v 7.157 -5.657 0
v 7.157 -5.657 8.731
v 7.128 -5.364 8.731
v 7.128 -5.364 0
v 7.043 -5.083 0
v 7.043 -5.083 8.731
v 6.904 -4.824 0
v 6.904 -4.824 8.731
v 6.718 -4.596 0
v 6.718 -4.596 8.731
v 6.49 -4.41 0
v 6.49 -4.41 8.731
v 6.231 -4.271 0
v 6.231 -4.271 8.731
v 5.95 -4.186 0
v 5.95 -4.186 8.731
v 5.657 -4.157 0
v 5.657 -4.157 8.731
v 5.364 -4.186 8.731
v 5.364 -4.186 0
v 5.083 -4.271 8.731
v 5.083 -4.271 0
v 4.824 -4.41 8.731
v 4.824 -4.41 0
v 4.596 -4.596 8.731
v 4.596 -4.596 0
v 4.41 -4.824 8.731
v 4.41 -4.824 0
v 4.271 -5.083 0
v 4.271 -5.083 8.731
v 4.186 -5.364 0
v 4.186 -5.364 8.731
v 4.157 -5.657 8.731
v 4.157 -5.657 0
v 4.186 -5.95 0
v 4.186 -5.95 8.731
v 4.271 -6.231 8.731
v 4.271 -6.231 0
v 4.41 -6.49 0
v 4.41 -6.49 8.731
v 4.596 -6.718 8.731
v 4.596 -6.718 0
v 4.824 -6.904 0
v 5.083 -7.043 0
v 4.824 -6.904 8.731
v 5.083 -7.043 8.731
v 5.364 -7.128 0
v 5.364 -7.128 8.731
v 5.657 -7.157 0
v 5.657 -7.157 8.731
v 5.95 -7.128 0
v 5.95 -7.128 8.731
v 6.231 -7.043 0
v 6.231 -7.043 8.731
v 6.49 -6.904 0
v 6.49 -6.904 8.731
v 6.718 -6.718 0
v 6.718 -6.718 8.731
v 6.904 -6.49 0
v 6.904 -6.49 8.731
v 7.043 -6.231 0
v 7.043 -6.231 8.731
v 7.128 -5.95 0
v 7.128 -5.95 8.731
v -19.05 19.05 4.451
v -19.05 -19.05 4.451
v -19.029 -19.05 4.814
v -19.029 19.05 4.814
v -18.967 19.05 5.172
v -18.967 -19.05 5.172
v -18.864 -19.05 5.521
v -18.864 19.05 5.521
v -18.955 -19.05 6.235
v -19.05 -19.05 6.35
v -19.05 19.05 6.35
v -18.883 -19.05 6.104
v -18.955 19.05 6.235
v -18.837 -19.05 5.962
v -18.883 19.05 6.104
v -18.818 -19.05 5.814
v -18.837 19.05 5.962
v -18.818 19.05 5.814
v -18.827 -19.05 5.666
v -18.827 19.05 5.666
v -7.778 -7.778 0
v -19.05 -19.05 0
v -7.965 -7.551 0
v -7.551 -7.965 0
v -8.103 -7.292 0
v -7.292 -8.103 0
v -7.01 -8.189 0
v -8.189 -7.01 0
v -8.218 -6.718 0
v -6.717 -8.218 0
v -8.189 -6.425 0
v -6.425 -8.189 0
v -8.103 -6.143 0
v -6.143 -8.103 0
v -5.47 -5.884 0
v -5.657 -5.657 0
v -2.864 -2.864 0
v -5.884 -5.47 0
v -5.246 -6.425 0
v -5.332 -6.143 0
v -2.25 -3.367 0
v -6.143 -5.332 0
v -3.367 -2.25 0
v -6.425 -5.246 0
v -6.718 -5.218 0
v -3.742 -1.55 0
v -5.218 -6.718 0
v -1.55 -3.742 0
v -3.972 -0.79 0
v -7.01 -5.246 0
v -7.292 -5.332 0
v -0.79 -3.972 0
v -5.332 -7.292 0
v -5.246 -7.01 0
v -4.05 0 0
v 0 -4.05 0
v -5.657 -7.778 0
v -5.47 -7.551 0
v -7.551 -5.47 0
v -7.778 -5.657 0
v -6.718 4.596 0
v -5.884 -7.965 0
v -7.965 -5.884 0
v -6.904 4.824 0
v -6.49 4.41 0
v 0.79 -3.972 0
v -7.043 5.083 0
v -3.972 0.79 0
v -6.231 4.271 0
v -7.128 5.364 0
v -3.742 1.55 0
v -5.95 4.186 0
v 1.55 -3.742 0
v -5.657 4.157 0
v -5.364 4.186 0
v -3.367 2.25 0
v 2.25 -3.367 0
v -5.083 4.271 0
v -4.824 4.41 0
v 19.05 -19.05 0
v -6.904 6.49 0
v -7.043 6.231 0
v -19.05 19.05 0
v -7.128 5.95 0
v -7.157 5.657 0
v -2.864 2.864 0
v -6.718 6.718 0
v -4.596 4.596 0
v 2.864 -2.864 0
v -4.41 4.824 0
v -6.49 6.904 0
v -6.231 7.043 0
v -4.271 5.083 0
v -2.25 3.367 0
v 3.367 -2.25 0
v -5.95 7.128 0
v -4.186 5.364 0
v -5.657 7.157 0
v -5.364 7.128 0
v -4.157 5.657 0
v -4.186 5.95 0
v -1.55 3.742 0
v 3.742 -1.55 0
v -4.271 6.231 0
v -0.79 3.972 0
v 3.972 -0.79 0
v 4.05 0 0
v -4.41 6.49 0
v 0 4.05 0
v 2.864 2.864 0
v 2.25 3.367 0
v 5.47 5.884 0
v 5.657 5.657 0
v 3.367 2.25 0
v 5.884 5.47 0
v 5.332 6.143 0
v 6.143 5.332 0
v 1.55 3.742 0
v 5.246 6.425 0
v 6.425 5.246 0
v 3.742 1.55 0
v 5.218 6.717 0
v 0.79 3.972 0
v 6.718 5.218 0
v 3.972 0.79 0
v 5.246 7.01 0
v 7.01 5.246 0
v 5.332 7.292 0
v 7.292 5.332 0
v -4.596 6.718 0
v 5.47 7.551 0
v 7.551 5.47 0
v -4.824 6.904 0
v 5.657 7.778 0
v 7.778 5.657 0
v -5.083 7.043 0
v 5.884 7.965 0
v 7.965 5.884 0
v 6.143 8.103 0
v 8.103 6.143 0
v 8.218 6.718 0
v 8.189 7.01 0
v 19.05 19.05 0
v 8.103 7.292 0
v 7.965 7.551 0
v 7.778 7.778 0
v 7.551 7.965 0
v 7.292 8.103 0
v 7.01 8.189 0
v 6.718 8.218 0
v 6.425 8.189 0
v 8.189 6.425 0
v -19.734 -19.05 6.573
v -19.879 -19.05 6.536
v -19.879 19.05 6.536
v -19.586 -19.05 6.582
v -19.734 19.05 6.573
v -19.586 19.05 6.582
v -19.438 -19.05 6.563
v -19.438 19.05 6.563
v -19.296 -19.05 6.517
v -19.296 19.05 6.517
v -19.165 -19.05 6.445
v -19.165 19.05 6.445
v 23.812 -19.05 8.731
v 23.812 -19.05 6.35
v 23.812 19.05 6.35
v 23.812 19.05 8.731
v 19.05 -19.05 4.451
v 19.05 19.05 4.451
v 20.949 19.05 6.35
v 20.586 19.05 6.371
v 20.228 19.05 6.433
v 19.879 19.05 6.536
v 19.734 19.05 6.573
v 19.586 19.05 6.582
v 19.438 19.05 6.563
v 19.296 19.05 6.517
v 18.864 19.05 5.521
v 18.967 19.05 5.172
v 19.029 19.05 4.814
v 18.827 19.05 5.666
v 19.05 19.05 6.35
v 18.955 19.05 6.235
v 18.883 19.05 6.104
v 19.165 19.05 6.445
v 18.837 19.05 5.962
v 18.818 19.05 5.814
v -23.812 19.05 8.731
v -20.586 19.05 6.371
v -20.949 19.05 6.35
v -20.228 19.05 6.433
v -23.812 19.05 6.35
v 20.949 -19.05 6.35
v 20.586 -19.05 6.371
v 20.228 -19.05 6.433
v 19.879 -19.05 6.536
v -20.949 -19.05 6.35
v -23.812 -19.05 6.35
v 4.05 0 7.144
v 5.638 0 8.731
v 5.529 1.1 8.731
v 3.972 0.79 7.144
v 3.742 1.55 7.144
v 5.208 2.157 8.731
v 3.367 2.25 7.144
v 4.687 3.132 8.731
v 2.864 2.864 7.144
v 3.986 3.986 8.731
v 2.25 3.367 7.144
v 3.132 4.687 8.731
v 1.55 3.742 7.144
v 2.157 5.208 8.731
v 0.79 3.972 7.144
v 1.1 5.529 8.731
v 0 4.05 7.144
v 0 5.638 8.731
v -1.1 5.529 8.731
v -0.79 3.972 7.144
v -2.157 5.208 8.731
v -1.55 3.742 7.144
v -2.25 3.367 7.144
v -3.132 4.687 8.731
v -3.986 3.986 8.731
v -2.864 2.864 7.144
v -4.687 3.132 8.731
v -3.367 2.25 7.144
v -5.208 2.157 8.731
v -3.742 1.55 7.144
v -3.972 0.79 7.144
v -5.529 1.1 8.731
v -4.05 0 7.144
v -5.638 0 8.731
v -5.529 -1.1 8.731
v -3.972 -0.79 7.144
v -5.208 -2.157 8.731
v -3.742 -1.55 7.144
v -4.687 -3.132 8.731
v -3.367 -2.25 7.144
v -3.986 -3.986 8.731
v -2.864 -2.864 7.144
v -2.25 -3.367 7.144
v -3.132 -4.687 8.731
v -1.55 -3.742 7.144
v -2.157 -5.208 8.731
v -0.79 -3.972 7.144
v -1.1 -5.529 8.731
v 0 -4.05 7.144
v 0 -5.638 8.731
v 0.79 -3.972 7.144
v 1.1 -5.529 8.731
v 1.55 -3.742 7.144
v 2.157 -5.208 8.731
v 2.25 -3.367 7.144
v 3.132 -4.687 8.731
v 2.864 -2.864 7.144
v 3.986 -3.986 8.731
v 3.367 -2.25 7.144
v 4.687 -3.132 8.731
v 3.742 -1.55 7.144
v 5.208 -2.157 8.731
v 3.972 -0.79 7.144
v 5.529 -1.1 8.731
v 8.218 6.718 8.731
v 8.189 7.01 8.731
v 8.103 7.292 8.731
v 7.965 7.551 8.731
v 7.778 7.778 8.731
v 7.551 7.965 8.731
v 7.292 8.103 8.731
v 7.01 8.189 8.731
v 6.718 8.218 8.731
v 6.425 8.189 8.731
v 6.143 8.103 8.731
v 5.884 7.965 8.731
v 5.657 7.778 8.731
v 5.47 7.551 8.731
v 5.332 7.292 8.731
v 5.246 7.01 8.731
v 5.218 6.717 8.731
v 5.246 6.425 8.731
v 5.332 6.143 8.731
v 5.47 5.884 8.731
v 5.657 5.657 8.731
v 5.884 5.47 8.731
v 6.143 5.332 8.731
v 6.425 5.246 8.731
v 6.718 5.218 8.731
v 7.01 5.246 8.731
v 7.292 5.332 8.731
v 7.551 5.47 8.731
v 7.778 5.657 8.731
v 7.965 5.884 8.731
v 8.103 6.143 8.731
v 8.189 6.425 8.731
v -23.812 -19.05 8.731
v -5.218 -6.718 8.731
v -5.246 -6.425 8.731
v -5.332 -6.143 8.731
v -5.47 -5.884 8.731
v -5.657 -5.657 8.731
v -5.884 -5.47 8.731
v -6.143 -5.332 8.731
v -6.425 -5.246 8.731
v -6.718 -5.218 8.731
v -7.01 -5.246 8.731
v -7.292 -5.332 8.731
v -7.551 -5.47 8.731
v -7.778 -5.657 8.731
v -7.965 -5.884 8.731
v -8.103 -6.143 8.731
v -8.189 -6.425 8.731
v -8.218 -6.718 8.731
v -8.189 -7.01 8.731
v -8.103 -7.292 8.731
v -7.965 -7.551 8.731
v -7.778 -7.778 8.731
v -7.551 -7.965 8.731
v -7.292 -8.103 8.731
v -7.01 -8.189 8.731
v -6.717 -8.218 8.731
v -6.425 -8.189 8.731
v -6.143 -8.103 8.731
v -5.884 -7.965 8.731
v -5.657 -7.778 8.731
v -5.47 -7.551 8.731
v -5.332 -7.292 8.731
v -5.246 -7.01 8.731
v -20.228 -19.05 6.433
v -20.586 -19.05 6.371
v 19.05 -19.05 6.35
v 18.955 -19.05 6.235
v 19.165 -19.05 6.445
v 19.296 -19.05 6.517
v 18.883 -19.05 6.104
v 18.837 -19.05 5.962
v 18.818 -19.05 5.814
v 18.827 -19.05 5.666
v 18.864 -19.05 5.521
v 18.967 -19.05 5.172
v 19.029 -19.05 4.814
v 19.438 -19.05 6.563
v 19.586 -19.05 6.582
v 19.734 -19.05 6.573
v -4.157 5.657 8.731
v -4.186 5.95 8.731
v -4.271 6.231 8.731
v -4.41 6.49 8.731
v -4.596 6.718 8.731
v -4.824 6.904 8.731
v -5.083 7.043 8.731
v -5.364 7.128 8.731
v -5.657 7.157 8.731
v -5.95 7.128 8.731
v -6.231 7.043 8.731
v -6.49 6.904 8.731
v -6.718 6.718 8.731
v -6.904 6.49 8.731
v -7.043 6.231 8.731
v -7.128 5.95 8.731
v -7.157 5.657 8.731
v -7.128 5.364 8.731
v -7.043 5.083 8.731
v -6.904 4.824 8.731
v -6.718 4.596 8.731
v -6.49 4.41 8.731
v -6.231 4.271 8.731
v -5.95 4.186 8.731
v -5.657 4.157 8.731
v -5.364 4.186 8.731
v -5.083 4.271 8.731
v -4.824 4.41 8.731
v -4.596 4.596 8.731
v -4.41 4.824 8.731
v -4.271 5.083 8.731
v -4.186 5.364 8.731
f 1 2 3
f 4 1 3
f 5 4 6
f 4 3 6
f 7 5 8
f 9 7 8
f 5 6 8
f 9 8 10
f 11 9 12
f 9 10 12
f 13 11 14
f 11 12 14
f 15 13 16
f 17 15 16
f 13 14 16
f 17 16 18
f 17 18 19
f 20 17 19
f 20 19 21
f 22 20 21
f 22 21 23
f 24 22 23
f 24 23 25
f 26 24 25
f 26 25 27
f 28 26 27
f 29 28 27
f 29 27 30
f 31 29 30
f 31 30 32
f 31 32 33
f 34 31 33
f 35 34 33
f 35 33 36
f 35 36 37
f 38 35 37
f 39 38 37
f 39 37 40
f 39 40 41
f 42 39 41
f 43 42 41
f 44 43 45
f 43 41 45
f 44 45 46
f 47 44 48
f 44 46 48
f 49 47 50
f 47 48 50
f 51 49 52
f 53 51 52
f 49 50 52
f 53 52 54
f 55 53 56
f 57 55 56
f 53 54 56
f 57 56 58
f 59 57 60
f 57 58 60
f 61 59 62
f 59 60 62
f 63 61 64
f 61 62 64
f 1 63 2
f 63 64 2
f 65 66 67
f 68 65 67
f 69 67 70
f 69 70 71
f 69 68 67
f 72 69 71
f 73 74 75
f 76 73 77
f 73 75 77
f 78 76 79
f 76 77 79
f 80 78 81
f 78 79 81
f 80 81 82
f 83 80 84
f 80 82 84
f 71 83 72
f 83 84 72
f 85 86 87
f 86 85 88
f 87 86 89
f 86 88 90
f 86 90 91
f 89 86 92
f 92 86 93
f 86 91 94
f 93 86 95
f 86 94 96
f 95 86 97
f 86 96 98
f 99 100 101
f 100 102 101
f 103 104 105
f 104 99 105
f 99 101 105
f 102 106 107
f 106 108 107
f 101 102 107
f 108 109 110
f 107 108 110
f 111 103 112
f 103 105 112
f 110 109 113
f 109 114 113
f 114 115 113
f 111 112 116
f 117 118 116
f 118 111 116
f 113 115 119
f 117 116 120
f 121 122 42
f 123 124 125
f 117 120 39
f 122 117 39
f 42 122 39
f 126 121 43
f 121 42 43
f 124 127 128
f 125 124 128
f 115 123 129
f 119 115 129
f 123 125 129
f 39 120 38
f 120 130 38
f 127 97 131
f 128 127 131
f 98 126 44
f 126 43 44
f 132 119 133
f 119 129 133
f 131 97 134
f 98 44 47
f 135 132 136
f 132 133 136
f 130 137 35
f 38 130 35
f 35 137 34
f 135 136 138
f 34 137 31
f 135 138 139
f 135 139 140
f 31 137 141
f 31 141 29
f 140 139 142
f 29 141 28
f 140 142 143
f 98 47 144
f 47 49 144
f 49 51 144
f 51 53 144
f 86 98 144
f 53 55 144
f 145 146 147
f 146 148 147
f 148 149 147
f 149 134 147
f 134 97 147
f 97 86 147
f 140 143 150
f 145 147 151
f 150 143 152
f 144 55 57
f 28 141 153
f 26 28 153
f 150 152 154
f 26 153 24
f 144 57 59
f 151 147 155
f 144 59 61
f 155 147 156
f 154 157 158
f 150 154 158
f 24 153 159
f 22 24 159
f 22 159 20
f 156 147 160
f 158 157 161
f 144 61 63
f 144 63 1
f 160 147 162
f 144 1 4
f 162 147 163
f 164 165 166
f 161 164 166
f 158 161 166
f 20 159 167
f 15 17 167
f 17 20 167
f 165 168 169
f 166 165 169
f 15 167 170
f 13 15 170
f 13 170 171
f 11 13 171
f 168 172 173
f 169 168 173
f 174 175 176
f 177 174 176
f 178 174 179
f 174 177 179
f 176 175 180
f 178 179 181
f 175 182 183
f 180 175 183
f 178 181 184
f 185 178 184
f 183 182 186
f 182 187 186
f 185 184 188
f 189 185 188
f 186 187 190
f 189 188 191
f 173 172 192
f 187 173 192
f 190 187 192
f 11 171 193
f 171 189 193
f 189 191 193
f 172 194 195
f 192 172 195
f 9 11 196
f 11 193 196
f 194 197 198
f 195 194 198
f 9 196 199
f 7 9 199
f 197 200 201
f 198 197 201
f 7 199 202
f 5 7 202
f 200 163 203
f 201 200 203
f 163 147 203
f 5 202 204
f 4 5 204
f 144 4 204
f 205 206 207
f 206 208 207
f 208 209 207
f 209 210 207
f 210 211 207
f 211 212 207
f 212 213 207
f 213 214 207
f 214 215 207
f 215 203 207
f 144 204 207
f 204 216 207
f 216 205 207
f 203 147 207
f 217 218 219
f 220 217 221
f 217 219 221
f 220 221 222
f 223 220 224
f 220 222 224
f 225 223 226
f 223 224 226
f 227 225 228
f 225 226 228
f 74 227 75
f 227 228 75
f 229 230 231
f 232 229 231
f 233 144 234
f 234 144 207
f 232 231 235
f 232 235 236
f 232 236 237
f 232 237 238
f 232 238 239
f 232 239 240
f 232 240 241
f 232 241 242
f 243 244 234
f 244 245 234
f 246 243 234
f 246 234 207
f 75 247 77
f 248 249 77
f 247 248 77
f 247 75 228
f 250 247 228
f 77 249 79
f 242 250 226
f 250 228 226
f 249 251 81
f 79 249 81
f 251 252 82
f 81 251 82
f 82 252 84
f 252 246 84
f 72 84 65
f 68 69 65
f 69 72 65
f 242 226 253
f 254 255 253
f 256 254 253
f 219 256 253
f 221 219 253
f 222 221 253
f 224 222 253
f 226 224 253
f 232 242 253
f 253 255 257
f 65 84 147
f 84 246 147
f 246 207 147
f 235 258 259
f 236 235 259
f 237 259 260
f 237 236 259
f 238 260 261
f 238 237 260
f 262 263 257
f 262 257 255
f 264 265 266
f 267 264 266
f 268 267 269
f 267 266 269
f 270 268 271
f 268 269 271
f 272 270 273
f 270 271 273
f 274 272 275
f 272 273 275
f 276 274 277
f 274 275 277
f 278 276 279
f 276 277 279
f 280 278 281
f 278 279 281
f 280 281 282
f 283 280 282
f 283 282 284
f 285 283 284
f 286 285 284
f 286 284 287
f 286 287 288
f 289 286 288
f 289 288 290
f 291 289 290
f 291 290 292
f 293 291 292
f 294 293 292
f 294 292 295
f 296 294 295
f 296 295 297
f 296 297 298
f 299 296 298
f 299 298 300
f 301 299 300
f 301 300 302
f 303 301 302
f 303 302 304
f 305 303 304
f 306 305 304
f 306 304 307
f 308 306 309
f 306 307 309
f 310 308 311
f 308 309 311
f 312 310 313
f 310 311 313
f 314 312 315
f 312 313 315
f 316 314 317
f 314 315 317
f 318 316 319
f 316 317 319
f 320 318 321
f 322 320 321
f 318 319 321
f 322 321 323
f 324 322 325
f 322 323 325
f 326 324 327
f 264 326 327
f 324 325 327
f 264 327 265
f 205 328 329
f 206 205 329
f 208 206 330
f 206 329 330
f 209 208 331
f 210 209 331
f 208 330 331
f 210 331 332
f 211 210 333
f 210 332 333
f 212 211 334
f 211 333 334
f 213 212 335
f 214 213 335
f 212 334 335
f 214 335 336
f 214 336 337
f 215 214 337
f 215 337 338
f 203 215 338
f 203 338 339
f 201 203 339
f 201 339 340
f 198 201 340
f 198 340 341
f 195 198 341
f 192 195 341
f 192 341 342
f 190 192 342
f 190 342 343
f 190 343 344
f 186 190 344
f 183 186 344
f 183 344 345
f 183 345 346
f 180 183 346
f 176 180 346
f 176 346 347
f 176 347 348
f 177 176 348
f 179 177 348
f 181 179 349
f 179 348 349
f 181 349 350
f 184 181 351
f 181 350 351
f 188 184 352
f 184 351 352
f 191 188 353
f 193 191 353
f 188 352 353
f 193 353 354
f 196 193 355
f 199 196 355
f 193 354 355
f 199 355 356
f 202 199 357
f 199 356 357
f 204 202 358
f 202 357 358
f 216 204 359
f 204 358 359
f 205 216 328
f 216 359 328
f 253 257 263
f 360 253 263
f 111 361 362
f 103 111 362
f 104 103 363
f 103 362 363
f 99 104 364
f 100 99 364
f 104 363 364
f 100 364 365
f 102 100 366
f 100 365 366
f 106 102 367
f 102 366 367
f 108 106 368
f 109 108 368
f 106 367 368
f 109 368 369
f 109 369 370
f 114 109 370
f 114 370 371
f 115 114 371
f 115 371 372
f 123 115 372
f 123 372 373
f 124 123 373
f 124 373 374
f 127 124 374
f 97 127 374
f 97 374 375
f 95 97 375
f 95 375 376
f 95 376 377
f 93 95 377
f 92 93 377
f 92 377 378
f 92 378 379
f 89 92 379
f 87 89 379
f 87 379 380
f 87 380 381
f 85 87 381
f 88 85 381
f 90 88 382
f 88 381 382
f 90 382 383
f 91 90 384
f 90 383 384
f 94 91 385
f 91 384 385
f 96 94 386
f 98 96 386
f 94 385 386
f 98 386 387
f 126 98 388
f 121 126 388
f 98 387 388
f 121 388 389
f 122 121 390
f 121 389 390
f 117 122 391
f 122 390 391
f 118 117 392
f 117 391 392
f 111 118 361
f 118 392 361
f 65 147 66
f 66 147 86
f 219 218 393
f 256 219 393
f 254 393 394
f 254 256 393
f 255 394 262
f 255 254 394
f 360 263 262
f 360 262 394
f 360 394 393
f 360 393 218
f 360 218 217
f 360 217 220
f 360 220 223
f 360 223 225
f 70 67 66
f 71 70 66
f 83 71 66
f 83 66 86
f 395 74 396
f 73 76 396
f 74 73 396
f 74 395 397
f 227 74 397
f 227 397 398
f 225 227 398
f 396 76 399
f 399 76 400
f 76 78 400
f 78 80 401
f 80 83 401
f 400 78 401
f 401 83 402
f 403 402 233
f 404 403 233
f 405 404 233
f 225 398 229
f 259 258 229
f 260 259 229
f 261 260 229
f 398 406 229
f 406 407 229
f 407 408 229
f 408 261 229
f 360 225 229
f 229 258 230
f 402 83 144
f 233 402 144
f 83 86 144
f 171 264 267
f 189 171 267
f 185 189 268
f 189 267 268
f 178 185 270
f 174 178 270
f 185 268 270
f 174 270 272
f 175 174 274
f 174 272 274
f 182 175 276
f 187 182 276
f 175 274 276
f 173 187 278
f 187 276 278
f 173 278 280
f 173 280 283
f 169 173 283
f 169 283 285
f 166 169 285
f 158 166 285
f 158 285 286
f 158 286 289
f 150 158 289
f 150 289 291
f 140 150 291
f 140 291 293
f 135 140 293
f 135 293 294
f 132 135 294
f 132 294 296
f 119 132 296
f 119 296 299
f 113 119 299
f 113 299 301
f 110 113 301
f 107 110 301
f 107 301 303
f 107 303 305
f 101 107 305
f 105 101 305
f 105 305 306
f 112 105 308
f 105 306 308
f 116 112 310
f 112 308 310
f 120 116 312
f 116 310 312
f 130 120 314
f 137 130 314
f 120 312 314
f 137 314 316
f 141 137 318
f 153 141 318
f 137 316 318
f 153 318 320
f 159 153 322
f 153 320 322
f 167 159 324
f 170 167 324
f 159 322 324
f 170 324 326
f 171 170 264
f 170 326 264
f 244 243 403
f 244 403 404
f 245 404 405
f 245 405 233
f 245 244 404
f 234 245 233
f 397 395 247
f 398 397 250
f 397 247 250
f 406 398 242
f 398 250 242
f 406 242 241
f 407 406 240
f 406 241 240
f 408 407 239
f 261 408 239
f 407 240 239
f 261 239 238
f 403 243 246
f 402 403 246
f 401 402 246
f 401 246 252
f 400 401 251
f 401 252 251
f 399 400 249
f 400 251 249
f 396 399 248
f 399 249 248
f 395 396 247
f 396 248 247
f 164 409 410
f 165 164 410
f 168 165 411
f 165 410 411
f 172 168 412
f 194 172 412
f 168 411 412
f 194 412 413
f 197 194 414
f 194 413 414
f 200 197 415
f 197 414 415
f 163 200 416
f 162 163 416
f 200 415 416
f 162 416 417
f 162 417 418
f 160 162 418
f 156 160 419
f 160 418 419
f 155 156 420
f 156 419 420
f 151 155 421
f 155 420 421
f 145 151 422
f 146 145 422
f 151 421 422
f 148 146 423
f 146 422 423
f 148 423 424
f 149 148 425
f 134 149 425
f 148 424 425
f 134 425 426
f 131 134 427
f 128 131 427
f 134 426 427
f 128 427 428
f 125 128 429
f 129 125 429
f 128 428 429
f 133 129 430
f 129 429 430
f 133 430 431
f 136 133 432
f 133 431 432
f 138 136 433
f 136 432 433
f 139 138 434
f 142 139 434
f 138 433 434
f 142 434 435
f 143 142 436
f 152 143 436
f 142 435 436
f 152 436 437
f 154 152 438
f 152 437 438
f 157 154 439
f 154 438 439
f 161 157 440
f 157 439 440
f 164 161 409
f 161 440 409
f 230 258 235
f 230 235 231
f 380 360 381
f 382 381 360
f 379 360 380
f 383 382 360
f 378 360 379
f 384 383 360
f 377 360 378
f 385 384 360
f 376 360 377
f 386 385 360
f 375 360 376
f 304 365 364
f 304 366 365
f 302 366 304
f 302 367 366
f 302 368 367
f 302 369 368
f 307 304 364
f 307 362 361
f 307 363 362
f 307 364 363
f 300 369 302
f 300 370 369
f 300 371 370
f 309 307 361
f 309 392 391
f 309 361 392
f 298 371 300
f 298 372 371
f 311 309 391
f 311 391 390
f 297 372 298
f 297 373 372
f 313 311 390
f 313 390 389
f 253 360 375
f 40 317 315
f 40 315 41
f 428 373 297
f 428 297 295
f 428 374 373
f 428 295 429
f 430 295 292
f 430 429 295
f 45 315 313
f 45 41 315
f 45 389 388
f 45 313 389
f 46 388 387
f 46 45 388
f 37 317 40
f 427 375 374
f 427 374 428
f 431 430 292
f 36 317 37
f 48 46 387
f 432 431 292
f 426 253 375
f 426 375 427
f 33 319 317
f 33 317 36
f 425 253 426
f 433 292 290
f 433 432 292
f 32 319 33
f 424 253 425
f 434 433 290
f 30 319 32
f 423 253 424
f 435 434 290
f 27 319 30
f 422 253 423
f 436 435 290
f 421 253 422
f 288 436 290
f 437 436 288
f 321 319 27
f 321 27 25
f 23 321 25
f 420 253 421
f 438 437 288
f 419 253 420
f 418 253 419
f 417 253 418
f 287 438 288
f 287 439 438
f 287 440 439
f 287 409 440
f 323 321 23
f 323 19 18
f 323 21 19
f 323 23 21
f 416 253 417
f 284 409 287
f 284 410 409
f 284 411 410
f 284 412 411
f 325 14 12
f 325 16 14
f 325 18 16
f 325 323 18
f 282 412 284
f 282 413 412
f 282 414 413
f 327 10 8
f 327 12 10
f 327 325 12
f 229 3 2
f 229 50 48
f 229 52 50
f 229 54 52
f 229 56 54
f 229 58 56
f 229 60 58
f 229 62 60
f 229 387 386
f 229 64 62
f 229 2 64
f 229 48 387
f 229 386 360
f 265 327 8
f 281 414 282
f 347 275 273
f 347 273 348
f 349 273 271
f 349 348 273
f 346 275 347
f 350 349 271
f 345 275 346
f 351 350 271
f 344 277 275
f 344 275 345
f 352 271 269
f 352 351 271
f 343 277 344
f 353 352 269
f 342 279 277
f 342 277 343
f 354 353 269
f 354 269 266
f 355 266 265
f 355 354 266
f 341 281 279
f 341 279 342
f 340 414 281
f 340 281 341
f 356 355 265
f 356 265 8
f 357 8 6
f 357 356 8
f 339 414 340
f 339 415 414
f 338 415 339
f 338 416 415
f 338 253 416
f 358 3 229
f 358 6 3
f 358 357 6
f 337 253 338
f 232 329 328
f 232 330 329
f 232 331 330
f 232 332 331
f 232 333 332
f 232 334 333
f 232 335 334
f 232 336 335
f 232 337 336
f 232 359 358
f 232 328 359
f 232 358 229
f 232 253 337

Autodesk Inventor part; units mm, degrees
ref_plane "YZ Plane" through (0, 0, 0) normal (1, 0, 0) x (0, 1, 0)
ref_plane "XZ Plane" through (0, 0, 0) normal (0, 1, 0) x (-1, 0, 0)
ref_plane "XY Plane" through (0, 0, 0) normal (0, 0, 1) x (1, 0, 0)
sketch "Sketch1" plane through (0, 0, 0) normal (0, 0, 1) x (1, 0, 0)
  line L0 (-19.05, -19.05) -> (19.05, -19.05)
  line L1 (19.05, -19.05) -> (19.05, 19.05)
  line L2 (19.05, 19.05) -> (-19.05, 19.05)
  line L3 (-19.05, 19.05) -> (-19.05, -19.05)
  line L4 (-19.05, -19.05) -> (19.05, 19.05) construction
  line L5 (19.05, -19.05) -> (-19.05, 19.05) construction
  point P0 (0, 0)
  dimension "d0" = 38.1
  dimension "d1" = 38.1
extrude "Extrusion1" add sketch "Sketch1" along normal blind 6.35
sketch "Sketch2" plane through (0, 0, 6.35) normal (0, 0, 1) x (1, 0, 0)
  line L0 (-23.8125, -19.05) -> (23.8125, -19.05)
  line L1 (23.8125, -19.05) -> (23.8125, 19.05)
  line L2 (23.8125, 19.05) -> (-23.8125, 19.05)
  line L3 (-23.8125, 19.05) -> (-23.8125, -19.05)
  line L4 (-23.8125, -19.05) -> (23.8125, 19.05) construction
  line L5 (23.8125, -19.05) -> (-23.8125, 19.05) construction
  point P0 (0, 0)
  point P1 (19.05, 19.05)
  dimension "d4" = 47.625
extrude "Extrusion2" add sketch "Sketch2" along normal blind 2.3813
sketch "Sketch3" plane through (-19.05, 19.05, 0) normal (0, 1, 0) x (1, 0, 0)
  line L0 (0, 0) -> (0, -6.35) construction
  line L1 (0, -6.35) -> (-0.5613, -5.7887) construction
  line L2 (0, -6.35) -> (-4.7625, -6.35) construction
  circle A0 centre (-0.5613, -5.7887) radius 0.7937
  line L3 (19.05, 0) -> (19.05, -8.7313) construction
  line L4 (42.8625, -8.7313) -> (-4.7625, -8.7313) projected
  circle A1 centre (38.6613, -5.7887) radius 0.7937
  dimension "d8" = 1.5875
  dimension "d7" = 45
extrude "Extrusion3" cut sketch "Sketch3" against normal through all
fillet "Fillet1" radius 3.175 4 edges at (-19.05, 0, 5.2275) (-20.1725, 0, 6.35) (20.1725, 0, 6.35) (19.05, 0, 5.2275)
sketch "Sketch4" plane through (0, 0, 8.7313) normal (0, 0, 1) x (1, 0, 0)
  circle A0 centre (0, 0) radius 4.05
  circle A1 centre (0, 0) radius 8 construction
  circle A2 centre (0, 0) radius 9.5 construction
  line L0 (0, 0) -> (0, 9.5) construction
  line L1 (0, 0) -> (-5.6569, 5.6569) construction
  line L2 (0, 0) -> (-6.7175, -6.7175) construction
  circle A3 centre (-5.6569, 5.6569) radius 1.5
  circle A4 centre (-6.7175, -6.7175) radius 1.5
  circle A5 centre (6.7175, 6.7175) radius 1.5
  circle A6 centre (5.6569, -5.6569) radius 1.5
  dimension "d13" = 16
  dimension "d12" = 8.1
  dimension "d14" = 19
  dimension "d15" = 45
  dimension "d16" = 3
  dimension "d17" = 3
  dimension "d20" = 360
extrude "Extrusion4" cut sketch "Sketch4" against normal through all
chamfer "Chamfer1" distance 1.5875 angle 45 1 edges at (-4.05, 0, 8.7313)
properties part number "Drill Guide"
